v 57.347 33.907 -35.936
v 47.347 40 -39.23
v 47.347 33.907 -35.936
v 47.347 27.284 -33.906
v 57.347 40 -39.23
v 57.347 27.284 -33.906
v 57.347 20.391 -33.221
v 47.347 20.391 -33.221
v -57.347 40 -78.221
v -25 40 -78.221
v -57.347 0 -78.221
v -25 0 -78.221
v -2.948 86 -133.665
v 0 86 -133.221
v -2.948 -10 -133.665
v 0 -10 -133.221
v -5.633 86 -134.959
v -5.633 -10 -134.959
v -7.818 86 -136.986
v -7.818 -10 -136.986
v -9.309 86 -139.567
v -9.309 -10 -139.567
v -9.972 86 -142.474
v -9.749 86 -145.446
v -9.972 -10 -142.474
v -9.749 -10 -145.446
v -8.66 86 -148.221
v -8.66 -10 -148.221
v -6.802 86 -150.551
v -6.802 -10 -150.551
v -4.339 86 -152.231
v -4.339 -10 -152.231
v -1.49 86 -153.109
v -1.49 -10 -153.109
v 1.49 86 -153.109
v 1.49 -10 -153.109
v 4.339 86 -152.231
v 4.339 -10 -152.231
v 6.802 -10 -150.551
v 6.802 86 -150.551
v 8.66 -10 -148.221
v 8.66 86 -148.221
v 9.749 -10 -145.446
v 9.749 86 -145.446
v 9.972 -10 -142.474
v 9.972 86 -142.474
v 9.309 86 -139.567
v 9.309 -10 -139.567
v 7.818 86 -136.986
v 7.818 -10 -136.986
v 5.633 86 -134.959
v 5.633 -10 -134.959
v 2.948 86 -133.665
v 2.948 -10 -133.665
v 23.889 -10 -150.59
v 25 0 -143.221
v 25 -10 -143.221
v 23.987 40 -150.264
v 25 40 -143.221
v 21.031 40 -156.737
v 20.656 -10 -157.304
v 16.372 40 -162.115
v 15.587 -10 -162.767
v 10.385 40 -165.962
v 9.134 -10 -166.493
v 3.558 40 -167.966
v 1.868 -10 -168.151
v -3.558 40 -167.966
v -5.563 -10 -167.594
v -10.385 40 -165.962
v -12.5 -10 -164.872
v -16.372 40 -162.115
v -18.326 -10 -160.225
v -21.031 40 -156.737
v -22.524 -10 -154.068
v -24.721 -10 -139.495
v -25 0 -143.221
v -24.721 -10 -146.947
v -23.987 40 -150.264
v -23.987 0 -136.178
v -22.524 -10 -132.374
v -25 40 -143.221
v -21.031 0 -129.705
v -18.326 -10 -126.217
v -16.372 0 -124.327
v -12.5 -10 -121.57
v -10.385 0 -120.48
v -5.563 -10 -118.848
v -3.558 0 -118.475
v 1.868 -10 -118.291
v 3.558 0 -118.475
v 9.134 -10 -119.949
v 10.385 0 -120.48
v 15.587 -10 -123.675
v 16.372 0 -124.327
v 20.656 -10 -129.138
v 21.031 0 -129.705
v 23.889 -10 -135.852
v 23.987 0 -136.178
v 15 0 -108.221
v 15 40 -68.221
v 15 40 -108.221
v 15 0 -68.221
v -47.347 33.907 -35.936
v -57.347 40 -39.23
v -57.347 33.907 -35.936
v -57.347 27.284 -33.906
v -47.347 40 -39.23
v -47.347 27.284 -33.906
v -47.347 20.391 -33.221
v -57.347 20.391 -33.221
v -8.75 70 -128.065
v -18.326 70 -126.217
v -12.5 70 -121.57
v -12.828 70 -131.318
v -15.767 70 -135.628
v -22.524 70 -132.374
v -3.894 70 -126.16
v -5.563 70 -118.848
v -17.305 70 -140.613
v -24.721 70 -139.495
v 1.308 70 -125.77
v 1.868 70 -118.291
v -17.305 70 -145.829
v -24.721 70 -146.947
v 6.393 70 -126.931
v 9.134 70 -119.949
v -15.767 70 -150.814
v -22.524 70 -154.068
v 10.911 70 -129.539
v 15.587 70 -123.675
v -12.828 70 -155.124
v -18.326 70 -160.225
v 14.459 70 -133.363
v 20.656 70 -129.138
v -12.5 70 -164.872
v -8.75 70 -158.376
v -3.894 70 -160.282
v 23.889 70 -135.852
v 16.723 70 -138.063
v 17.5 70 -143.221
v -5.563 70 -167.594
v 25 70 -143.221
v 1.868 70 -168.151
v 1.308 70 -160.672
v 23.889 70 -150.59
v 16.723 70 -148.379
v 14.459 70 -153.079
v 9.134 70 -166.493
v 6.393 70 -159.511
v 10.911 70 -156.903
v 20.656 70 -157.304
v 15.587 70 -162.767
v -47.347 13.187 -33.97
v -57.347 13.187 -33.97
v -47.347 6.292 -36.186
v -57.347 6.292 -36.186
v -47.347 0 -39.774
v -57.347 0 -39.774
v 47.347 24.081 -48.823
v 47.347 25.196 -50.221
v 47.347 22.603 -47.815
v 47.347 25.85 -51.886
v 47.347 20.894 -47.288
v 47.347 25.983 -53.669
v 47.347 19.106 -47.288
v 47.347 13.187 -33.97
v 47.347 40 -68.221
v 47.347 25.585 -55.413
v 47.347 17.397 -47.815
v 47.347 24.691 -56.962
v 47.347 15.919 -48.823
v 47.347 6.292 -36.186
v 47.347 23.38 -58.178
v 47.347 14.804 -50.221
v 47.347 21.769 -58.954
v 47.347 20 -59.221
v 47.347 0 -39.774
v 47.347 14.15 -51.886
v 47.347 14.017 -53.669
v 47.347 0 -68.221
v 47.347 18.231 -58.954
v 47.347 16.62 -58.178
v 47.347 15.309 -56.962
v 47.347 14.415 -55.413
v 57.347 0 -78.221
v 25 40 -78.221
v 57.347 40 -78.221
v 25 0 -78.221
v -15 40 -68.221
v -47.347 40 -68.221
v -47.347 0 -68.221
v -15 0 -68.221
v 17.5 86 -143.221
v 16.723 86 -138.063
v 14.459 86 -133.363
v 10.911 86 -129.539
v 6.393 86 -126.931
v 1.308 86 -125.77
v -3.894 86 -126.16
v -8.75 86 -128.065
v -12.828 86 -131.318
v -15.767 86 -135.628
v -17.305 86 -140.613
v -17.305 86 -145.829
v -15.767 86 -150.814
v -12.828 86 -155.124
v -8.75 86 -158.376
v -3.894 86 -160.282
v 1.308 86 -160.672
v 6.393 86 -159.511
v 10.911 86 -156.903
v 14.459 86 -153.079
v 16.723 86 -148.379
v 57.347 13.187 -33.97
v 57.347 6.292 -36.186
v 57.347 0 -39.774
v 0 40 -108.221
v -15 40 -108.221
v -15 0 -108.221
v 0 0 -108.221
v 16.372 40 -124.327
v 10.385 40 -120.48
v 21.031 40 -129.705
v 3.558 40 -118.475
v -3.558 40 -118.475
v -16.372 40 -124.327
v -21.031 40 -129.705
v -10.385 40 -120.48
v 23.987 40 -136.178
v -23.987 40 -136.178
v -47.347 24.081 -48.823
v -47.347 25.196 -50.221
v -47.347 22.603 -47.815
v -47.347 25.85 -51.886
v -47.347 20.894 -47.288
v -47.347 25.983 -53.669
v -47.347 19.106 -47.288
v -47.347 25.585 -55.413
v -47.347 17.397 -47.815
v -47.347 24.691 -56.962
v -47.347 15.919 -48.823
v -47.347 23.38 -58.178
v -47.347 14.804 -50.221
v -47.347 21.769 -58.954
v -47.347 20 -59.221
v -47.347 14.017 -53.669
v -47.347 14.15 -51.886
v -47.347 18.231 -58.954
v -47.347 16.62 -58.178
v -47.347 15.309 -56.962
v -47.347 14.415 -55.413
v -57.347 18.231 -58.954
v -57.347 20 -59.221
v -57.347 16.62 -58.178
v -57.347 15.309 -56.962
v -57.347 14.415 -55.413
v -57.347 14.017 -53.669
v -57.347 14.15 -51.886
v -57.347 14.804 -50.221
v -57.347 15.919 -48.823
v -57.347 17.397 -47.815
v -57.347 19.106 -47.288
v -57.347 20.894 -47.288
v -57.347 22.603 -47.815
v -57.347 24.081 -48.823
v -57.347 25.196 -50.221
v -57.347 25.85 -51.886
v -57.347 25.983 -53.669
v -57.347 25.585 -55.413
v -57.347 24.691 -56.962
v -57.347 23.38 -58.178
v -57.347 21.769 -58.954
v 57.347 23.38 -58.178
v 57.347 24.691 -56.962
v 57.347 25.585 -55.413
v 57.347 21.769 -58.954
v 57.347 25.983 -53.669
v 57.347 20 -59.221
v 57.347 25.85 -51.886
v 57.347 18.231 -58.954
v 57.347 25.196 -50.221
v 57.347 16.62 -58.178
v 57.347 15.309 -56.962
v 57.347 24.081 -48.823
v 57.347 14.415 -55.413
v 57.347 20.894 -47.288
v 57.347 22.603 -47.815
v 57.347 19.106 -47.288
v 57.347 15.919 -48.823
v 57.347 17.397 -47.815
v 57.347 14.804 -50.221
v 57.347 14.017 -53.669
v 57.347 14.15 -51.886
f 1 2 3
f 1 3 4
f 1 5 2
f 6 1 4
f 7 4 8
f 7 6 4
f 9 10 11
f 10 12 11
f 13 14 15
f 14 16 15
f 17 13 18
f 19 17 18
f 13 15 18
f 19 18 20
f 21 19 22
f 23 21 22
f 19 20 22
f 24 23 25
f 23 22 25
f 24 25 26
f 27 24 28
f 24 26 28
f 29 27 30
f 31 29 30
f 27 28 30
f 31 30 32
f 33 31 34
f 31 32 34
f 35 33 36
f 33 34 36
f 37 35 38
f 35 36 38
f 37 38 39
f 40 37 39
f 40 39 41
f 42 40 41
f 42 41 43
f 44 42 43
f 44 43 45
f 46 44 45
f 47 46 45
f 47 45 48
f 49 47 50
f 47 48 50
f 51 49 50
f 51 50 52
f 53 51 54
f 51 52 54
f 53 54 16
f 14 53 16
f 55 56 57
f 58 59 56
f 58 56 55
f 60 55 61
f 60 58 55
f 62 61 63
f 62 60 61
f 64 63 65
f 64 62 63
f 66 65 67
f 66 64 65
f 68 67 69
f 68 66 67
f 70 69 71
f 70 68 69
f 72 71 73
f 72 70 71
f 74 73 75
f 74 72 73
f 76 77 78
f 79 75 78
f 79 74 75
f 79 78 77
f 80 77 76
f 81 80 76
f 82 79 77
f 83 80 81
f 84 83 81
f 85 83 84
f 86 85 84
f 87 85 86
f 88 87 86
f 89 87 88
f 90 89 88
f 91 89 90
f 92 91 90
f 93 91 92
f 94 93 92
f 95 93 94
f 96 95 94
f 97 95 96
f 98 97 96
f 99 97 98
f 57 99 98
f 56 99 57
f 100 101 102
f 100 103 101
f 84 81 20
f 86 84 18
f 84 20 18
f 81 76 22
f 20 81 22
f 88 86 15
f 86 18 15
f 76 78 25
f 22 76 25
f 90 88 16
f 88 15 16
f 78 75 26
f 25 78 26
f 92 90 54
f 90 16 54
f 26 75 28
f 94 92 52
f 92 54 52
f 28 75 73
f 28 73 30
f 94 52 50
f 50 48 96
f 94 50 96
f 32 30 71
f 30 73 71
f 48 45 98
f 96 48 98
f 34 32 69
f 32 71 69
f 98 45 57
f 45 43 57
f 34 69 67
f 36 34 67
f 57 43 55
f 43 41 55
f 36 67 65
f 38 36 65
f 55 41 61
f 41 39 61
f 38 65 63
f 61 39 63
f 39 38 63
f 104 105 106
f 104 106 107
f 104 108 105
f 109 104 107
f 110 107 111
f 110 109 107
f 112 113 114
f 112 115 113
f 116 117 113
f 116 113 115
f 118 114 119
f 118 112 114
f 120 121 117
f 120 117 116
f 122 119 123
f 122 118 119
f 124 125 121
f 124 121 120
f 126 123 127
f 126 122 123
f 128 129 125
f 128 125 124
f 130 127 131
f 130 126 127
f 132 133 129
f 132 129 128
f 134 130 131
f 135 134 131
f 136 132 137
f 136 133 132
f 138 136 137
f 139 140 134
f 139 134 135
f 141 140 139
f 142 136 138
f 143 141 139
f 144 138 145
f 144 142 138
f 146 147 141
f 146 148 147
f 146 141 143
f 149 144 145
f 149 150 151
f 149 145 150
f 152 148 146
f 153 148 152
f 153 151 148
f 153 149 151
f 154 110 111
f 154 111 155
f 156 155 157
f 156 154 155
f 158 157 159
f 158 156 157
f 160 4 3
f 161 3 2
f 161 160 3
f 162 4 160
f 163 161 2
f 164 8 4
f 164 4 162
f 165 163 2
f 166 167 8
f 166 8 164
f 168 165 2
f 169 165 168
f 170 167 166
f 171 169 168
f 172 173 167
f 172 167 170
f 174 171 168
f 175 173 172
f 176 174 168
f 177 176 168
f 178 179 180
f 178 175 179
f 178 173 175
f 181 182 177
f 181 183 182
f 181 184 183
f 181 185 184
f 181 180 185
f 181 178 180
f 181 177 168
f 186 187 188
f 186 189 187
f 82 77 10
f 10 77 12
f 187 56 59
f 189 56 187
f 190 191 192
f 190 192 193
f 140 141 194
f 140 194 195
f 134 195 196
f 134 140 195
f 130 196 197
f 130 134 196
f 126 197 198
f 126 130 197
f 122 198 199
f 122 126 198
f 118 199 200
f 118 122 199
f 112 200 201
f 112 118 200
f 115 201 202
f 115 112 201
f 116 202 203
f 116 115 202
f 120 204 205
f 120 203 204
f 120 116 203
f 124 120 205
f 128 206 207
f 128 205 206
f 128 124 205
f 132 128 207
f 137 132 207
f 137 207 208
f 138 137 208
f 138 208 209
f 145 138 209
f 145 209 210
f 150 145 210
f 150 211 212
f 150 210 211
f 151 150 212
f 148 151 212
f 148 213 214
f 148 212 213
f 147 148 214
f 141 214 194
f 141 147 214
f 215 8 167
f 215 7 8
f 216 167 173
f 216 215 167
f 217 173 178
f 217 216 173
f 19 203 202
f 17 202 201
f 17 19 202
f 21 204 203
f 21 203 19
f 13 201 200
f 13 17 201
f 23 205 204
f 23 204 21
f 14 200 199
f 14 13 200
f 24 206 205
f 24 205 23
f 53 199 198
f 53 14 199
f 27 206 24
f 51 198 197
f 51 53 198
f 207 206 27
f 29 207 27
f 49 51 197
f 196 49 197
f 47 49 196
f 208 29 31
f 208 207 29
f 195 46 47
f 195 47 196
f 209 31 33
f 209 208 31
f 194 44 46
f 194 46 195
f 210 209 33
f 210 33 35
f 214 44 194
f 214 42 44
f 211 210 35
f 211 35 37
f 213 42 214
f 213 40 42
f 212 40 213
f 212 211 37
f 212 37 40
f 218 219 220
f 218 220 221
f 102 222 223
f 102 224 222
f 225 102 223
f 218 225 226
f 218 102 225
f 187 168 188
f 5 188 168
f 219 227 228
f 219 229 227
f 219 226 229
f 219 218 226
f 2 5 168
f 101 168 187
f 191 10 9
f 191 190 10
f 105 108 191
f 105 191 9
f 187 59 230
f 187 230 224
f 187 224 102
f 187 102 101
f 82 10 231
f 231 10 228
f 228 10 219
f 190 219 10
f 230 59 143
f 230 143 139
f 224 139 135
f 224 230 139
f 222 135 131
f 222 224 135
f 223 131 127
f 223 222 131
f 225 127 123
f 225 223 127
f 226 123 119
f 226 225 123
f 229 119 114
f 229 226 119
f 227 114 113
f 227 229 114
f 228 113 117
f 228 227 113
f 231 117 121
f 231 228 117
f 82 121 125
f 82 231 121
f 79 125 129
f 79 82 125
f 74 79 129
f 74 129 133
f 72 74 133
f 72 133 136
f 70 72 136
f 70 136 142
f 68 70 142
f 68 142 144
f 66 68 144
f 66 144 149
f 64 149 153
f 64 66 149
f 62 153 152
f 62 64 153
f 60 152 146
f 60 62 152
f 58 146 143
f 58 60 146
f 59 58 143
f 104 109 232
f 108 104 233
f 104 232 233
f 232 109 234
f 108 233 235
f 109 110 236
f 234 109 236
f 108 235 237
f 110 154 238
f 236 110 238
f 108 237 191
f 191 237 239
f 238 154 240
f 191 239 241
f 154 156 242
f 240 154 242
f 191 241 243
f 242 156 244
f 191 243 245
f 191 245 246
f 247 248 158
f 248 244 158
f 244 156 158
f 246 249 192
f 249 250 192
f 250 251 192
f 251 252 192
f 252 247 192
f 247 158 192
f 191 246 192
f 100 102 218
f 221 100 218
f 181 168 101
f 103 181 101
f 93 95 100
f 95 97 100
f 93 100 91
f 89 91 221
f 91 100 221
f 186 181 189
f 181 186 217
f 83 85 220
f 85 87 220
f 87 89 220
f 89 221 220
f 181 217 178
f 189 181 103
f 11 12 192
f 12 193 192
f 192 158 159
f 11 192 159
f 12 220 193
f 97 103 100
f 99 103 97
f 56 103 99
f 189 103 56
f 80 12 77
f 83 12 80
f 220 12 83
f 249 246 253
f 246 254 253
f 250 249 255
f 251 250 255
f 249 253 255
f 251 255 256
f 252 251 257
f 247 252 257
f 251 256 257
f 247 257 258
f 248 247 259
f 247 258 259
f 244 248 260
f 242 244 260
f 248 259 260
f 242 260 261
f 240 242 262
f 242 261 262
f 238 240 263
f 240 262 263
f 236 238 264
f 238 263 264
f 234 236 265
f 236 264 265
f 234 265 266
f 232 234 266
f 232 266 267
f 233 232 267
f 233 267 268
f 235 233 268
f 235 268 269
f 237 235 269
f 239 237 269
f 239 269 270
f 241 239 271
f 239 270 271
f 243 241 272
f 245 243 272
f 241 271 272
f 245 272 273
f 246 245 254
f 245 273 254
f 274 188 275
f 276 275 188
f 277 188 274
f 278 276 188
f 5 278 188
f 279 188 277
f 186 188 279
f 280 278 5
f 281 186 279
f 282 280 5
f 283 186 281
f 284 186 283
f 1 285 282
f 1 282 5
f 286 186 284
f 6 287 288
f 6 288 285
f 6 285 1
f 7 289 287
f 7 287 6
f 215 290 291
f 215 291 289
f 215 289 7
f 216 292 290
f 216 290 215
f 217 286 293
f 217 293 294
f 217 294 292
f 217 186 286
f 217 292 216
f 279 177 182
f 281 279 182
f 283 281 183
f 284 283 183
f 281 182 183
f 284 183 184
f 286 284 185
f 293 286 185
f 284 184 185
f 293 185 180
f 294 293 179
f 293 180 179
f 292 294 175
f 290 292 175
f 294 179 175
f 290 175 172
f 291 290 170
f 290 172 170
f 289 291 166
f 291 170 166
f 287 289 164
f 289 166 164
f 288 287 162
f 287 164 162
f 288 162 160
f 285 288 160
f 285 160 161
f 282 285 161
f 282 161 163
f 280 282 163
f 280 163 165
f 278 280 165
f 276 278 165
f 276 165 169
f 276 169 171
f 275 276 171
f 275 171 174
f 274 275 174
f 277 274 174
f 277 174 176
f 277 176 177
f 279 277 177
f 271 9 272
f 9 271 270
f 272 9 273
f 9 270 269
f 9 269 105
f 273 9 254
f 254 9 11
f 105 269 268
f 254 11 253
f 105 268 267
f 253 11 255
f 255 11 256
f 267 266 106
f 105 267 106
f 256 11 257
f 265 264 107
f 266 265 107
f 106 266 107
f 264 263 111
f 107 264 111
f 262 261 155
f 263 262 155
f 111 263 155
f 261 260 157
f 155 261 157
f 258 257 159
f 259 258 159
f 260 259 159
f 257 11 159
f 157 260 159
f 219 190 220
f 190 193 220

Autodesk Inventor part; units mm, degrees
ref_plane "YZ Plane" through (0, 0, 0) normal (1, 0, 0) x (0, 1, 0)
ref_plane "XZ Plane" through (0, 0, 0) normal (0, 1, 0) x (-1, 0, 0)
ref_plane "XY Plane" through (0, 0, 0) normal (0, 0, 1) x (1, 0, 0)
sketch "Szkic1" plane through (0, 0, 0) normal (0, 1, 0) x (-1, 0, 0)
  circle A0 centre (0, -143.2209) radius 25
  line L0 (25, -143.2209) -> (25, -78.2209)
  line L1 (25, -78.2209) -> (57.3466, -78.2209)
  line L2 (57.3466, -78.2209) -> (57.3466, -33.2209)
  line L3 (57.3466, -33.2209) -> (47.3466, -33.2209)
  line L4 (47.3466, -33.2209) -> (47.3466, -68.2209)
  line L5 (47.3466, -68.2209) -> (15, -68.2209)
  line L6 (15, -68.2209) -> (15, -108.2209)
  line L7 (15, -108.2209) -> (0, -108.2209)
  line L8 (0, -108.2209) -> (0, 0)
  line L9 (-25, -143.2209) -> (-25, -78.2209)
  line L10 (-25, -78.2209) -> (-57.3466, -78.2209)
  line L11 (-57.3466, -78.2209) -> (-57.3466, -33.2209)
  line L12 (-57.3466, -33.2209) -> (-47.3466, -33.2209)
  line L13 (-47.3466, -33.2209) -> (-47.3466, -68.2209)
  line L14 (-47.3466, -68.2209) -> (-15, -68.2209)
  line L15 (-15, -68.2209) -> (-15, -108.2209)
  line L16 (-15, -108.2209) -> (0, -108.2209)
  point P0 (7.5, -108.2209)
  point P1 (52.3466, -33.2209)
  dimension "d0" = 50
  dimension "d1" = 35
  dimension "d2" = 65
  dimension "d3" = 10
  dimension "d4" = 45
  dimension "d5" = 15
  dimension "d6" = 10
  dimension "d7" = 10
extrude "Wyciągnięcie proste1" add sketch "Szkic1" along normal blind 40 contours A0 L9 L10 L11 L12 L13 L14 L15 L16 L7 L6 L5 L4 L3 L2 L1 L0
sketch "Szkic2" plane through (0, 40, 0) normal (0, 1, 0) x (1, 0, 0)
  point P0 (0, 0)
sketch "Szkic3" plane through (0, 40, 0) normal (0, 1, 0) x (1, 0, 0)
  circle A0 centre (0, 143.2209) radius 25
  point P0 (0, 0)
extrude "Wyciągnięcie proste2" add sketch "Szkic3" along normal blind 30 and the other way blind 50
sketch "Szkic4" plane through (0, 70, -143.2209) normal (0, 1, 0) x (1, 0, 0)
  circle A0 centre (0, 0) radius 17.5
  point P0 (0, -143.2209)
  dimension "d14" = 35
extrude "Wyciągnięcie proste3" add sketch "Szkic4" along normal blind 16
sketch "Szkic5" plane through (0, 86, -143.2209) normal (0, 1, 0) x (1, 0, 0)
  point P0 (0, -143.2209)
  point P1 (0, 0)
hole "Otwór1" at (0, 86, -143.2209) direction (0, -1, 0) diameter 20 end through all
sketch "Szkic6" plane through (57.3466, 0, -33.2209) normal (1, 0, 0) x (0, 0, -1)
  line L0 (0, 0) -> (0, 40) projected
  circle A0 centre (35, 20.3911) radius 35
  line L1 (0, 0) -> (0, 40) projected
  line L2 (35, 40) -> (0, 40) projected
  line L3 (6.0088, 40) -> (0, 40)
  line L4 (35, 0) -> (0, 0) projected
  line L5 (0, 40) -> (0, 0)
  line L6 (0, 0) -> (6.5535, 0)
  point P0 (-33.2209, 0)
  point P1 (0, 20.3911)
  dimension "d24" = 70
extrude "Wyciągnięcie proste4" cut sketch "Szkic6" against normal through all contours L0 A0 L4 | L0 L2 A0
sketch "Szkic7" plane through (57.3466, 0, -78.2209) normal (1, 0, 0) x (0, 0, -1)
  line L0 (-38.4465, 0) -> (0, 0) projected
  arc A0 (-38.9912, 40) -> (-38.4465, 0) centre (-10, 20.3911) ccw projected
  point P0 (-78.2209, 0)
  point P1 (-25, 20)
  dimension "d27" = 20
  dimension "d28" = 15
hole "Otwór2" at (57.3466, 20, -53.2209) direction (-1, 0, 0) diameter 12 end through all
